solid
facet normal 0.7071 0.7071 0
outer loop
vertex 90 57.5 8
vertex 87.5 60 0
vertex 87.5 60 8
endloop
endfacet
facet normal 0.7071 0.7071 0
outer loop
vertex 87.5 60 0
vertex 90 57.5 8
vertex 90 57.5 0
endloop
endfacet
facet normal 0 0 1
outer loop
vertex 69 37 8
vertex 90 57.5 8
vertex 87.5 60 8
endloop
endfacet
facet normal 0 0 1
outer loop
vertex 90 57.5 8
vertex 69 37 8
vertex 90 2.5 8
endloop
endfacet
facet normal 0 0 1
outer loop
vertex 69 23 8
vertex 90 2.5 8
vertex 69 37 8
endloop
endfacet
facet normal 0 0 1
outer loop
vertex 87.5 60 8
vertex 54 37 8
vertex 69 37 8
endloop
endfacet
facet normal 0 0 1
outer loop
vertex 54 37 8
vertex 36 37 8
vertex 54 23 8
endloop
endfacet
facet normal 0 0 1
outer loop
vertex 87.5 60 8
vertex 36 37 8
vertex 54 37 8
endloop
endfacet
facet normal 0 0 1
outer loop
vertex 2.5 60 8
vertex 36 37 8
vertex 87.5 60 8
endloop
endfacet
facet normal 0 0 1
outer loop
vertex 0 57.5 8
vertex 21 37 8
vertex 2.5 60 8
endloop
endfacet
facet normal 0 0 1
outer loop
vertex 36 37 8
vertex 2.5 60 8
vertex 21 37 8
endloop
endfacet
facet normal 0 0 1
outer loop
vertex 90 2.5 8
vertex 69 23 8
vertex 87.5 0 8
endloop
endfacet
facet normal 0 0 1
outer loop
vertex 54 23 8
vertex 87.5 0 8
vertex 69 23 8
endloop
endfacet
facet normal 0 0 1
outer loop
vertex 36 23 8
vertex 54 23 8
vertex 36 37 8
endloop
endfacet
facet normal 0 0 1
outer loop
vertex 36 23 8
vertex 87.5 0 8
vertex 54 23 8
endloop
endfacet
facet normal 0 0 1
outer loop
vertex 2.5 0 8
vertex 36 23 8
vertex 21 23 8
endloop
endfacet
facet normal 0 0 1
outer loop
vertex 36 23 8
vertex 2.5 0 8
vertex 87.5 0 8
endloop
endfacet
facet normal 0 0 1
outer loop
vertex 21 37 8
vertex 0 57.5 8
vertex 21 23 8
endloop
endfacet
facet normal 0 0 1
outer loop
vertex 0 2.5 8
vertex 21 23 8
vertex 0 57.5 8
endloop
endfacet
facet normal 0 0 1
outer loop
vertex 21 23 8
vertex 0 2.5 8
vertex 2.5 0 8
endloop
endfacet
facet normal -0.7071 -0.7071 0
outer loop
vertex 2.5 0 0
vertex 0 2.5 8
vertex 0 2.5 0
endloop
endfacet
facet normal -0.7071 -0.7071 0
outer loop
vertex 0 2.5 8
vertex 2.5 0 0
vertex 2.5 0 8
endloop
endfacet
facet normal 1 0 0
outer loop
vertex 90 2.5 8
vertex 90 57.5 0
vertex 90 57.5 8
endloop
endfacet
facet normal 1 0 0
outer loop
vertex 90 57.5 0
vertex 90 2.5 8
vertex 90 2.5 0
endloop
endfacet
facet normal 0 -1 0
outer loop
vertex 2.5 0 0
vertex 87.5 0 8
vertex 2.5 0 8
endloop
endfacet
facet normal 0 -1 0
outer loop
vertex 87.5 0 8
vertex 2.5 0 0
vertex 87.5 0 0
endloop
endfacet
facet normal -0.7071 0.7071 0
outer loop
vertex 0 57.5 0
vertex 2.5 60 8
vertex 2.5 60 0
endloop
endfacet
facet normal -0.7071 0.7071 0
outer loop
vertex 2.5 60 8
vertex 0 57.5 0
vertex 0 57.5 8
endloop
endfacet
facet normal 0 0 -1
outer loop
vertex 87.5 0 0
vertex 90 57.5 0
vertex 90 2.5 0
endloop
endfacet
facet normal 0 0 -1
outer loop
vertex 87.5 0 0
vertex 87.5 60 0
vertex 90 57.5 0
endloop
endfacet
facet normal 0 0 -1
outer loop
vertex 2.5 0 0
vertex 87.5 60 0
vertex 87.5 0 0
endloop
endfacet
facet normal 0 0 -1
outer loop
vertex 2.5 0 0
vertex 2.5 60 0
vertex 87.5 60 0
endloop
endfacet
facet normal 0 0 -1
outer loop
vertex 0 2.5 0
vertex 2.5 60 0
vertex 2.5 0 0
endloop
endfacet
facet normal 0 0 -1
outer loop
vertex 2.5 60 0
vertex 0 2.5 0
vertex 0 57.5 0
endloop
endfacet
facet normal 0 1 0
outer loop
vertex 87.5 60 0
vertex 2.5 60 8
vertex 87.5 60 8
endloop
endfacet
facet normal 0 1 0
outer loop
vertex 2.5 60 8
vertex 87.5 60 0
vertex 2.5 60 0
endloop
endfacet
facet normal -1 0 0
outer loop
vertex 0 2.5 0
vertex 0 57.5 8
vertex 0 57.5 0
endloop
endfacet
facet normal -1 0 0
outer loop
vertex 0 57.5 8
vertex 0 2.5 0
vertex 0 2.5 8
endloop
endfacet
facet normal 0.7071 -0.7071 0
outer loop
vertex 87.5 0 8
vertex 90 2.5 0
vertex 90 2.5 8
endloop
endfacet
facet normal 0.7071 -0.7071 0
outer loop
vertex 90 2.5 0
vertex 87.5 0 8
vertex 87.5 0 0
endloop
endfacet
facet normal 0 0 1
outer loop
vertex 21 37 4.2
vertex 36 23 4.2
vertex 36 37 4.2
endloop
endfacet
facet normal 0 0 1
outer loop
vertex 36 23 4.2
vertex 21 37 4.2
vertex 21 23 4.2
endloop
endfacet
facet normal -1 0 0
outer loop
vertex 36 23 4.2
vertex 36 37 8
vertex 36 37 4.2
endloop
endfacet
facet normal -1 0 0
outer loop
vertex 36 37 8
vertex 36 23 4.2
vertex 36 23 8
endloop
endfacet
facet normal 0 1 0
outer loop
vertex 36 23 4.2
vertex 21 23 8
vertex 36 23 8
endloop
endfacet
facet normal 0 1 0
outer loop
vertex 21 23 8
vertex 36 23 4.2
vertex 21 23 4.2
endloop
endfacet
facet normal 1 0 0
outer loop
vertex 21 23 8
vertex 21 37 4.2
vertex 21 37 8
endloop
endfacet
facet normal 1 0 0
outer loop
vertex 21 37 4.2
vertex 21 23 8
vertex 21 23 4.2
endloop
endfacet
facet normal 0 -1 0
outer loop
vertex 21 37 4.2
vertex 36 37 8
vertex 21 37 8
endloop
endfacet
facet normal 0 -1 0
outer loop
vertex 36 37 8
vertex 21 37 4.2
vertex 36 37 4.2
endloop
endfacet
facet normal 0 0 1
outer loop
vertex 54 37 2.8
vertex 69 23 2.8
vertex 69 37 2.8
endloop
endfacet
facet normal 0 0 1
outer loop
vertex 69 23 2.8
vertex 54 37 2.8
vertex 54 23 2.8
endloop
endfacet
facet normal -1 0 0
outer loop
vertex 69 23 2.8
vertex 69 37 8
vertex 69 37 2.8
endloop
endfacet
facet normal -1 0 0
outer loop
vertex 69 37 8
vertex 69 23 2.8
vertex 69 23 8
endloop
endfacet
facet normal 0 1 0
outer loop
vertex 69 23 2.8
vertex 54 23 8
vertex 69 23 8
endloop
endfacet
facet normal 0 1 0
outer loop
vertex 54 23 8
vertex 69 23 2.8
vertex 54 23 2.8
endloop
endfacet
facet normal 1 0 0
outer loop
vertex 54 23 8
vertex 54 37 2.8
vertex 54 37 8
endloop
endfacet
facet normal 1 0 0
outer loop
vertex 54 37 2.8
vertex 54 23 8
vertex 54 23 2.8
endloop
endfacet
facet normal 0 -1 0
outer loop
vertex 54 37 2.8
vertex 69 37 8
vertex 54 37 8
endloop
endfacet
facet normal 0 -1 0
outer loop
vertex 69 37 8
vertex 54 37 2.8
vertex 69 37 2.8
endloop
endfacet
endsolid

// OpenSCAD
$fn = 32;

// ----------------------------------------------------------------------
// Windowed plate: 2 voids, 90 x 60 x 8 mm
// ----------------------------------------------------------------------

// --- parameters (mm) ---
plate_l = 90;             // plate length, X
plate_w = 60;             // plate width, Y
plate_t = 8;              // plate thickness, Z
edge_margin = 12;         // wall from the plate edge to any window
windows = 2;              // number of windows in the row
win_l = 15;               // window length
win_w = 14;               // window width
win_pitch = 33;           // window pitch along X
depth_1 = 3.8;            // depth of void 1 (full thickness = through)
depth_2 = 5.2;            // depth of void 2 (full thickness = through)
corner_c = 2.5;           // corner chamfer of the plate

profile = [[2.5, 0], [87.5, 0], [90, 2.5], [90, 57.5], [87.5, 60], [2.5, 60], [0, 57.5], [0, 2.5]];  // primary outline, 8 points, counter clockwise
void_1 = [[21, 23], [36, 23], [36, 37], [21, 37]];  // window 1 of the row, 4 points
void_2 = [[54, 23], [69, 23], [69, 37], [54, 37]];  // window 2 of the row, 4 points

// --- the one profile operation ---
difference() {
  linear_extrude(height = plate_t) polygon(points = profile);
  translate([0, 0, plate_t - depth_1])
    linear_extrude(height = depth_1 + 1) polygon(points = void_1);
  translate([0, 0, plate_t - depth_2])
    linear_extrude(height = depth_2 + 1) polygon(points = void_2);
}
